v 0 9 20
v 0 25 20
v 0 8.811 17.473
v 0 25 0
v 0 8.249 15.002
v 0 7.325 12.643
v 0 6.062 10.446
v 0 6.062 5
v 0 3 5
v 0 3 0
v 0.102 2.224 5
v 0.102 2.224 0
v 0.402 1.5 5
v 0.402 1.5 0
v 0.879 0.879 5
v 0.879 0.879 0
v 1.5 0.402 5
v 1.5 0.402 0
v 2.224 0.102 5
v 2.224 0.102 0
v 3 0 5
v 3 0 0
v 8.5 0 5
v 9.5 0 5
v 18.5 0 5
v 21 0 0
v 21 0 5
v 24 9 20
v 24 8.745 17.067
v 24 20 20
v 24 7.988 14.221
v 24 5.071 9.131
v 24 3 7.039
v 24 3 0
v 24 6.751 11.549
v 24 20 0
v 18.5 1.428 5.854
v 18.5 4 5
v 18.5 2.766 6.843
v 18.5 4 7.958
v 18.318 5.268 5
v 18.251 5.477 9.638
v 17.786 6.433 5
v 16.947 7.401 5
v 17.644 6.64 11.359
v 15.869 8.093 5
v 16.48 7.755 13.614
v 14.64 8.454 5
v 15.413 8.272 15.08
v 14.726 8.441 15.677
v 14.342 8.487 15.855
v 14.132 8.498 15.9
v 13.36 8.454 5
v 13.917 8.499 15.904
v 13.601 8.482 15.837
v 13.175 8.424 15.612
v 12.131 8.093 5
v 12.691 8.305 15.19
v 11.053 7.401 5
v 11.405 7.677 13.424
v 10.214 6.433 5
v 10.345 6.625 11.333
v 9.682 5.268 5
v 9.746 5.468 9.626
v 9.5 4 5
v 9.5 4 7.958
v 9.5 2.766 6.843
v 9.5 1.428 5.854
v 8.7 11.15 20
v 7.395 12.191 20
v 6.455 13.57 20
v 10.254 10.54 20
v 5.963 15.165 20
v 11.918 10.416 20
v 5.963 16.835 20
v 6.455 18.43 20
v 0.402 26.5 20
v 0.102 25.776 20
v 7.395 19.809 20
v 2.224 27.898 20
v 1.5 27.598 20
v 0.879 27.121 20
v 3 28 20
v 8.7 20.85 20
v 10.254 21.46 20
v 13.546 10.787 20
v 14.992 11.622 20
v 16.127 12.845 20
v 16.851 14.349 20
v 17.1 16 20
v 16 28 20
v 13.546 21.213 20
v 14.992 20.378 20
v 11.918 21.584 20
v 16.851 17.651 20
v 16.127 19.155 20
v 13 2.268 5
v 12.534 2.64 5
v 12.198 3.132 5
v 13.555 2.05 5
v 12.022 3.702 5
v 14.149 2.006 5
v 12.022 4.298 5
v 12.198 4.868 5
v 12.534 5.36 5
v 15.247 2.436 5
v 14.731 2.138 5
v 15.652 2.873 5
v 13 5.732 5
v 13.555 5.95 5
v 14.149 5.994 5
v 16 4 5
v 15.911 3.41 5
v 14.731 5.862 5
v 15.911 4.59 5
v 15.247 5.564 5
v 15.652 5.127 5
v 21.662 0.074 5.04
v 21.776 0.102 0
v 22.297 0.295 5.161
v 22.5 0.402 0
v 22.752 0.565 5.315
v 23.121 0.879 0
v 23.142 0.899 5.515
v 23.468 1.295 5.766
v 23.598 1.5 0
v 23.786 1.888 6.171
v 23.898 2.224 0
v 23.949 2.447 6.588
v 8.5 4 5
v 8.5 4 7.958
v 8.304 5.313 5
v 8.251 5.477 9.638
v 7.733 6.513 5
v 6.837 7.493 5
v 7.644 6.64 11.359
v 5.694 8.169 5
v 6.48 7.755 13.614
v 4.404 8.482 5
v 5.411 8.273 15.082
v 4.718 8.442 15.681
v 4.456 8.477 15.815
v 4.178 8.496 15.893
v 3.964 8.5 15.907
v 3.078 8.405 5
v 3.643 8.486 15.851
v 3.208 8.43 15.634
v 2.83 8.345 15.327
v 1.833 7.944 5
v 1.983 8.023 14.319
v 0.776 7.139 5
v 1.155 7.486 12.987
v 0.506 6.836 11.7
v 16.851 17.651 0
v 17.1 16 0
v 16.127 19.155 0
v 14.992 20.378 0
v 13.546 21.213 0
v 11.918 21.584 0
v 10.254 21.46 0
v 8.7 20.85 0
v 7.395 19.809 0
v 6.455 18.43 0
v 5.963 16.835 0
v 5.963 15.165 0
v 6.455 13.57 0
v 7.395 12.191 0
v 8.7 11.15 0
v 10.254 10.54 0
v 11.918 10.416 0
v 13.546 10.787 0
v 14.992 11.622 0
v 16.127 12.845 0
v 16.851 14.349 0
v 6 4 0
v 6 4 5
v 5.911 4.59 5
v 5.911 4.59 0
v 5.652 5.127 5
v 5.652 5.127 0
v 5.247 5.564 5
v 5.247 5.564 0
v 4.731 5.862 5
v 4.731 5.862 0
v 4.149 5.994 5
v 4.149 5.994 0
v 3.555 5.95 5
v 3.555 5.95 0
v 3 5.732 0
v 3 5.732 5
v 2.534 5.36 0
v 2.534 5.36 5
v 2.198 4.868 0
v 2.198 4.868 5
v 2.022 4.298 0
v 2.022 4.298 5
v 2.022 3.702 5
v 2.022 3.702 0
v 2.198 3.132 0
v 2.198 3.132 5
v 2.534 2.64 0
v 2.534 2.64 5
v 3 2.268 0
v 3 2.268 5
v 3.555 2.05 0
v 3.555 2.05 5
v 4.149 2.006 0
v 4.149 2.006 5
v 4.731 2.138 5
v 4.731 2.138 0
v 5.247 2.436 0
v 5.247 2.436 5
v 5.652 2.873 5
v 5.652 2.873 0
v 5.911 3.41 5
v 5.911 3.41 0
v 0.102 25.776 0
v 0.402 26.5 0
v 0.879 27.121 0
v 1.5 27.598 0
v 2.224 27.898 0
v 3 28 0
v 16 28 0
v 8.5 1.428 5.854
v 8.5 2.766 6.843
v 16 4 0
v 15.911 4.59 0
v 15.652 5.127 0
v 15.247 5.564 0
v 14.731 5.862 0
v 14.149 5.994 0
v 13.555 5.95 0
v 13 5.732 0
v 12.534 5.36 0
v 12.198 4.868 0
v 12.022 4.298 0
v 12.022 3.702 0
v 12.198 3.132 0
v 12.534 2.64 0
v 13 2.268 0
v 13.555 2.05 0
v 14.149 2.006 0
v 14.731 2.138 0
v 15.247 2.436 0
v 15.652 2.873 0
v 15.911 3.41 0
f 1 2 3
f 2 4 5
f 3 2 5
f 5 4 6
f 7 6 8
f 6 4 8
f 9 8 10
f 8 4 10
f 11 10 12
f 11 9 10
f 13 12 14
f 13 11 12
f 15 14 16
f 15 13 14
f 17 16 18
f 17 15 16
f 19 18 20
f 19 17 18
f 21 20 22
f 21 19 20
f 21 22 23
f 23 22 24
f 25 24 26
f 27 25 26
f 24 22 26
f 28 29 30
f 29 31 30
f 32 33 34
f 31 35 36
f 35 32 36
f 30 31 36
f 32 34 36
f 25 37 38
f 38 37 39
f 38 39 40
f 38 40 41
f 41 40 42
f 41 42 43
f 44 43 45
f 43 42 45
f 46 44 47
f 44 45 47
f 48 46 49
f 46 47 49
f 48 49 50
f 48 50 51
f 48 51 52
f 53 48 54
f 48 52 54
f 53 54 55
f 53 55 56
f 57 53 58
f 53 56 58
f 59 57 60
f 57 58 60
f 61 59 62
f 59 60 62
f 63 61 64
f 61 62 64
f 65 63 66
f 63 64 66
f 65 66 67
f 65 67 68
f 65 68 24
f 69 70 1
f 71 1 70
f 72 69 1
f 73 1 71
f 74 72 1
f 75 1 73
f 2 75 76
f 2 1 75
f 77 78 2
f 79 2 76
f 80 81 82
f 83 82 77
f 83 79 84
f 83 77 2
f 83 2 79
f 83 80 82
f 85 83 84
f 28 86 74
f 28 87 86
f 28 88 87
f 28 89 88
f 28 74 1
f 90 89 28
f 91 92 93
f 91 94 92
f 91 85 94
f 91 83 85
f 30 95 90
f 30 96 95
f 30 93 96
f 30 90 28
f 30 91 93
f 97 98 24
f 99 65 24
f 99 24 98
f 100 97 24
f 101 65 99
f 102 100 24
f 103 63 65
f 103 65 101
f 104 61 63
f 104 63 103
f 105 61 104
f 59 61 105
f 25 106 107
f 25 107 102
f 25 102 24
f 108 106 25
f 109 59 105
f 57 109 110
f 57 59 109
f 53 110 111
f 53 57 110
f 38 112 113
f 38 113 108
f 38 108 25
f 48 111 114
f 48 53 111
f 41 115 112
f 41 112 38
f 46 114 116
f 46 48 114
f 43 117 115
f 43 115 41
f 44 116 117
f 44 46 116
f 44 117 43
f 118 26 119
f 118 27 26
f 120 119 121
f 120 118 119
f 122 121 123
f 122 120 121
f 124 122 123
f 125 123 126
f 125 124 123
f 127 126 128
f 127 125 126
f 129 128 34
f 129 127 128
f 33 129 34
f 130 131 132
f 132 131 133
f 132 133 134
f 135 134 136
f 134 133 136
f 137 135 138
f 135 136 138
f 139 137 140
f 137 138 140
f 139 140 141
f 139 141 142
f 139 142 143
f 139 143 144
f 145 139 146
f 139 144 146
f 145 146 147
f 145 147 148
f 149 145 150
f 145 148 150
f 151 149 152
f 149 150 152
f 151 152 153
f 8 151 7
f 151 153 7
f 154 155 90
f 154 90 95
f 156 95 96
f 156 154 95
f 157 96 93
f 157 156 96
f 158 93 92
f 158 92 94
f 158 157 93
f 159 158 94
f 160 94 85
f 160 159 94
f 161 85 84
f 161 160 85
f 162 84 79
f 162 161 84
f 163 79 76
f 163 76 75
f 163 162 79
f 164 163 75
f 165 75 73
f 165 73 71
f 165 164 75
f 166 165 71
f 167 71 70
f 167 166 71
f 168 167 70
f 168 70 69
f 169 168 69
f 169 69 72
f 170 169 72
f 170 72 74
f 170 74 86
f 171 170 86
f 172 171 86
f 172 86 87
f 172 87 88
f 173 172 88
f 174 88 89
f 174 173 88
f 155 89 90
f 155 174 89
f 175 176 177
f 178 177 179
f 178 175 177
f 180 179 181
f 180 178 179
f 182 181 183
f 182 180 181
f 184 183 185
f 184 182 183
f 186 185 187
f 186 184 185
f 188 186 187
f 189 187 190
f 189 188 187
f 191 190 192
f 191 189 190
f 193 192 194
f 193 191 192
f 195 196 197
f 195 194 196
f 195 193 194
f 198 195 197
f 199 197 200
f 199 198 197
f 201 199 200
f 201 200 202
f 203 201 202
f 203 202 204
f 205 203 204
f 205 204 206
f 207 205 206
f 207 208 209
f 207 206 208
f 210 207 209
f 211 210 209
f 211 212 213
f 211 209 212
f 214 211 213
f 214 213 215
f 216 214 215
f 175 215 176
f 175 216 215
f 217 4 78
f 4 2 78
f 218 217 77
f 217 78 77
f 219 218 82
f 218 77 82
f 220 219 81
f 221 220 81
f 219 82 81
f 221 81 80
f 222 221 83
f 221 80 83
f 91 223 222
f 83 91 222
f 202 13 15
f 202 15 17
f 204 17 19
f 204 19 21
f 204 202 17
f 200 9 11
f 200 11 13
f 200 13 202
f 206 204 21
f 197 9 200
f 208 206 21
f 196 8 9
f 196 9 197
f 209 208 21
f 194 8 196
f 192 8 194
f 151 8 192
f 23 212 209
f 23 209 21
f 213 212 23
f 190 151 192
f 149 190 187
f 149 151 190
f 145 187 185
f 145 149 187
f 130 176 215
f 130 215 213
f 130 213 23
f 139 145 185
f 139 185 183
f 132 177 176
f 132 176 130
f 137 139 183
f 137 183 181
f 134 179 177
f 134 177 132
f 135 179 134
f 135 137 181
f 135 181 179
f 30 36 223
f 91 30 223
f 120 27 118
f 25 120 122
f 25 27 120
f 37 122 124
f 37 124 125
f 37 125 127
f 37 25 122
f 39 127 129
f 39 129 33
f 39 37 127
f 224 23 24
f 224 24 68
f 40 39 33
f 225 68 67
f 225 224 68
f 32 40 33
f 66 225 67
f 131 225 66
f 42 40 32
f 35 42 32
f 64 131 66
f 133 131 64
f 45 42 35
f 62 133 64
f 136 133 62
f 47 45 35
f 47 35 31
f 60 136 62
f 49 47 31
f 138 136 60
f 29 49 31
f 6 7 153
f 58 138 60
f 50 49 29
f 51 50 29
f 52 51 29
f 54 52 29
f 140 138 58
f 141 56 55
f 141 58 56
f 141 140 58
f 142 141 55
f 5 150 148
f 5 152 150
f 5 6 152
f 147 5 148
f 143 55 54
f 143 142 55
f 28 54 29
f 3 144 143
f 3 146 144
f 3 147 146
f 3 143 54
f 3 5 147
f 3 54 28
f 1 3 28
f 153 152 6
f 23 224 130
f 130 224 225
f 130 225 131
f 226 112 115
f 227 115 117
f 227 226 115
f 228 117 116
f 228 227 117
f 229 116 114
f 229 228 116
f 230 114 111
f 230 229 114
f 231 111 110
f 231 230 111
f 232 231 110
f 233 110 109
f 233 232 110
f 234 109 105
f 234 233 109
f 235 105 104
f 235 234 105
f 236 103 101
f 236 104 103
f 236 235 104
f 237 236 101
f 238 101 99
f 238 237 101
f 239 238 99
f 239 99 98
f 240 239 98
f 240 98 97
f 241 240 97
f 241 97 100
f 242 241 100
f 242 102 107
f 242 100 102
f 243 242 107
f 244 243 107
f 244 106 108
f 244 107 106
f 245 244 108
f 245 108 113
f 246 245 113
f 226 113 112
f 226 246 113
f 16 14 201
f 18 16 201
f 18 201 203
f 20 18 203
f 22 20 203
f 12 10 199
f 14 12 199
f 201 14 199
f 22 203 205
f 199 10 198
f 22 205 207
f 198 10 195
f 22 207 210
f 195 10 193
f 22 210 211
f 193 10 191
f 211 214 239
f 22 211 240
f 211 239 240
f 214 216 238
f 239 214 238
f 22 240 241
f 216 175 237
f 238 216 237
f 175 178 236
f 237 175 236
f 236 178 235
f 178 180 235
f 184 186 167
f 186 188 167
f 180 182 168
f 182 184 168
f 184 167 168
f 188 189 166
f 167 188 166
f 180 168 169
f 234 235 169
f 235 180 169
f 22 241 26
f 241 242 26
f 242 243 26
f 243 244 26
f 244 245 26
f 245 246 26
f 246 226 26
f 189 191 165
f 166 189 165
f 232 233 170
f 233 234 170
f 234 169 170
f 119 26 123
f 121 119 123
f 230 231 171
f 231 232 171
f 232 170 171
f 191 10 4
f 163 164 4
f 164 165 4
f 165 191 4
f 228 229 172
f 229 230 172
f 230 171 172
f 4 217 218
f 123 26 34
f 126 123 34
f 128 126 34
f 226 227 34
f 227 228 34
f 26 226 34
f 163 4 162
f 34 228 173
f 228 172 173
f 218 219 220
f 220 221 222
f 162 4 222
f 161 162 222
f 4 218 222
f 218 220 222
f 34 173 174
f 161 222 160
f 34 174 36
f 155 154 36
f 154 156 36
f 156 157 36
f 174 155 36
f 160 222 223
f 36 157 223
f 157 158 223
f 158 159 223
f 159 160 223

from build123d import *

# Parameters (mm, degrees)
SKETCH1_R           = 2
SKETCH1_R_2         = 5.6
BOSS_EXTRUDE1_DEPTH = 20
CUT_EXTRUDE1_DEPTH  = 30
CUT_EXTRUDE2_DEPTH  = 15
FILLET1_R           = 3


with BuildPart() as part:
    # Sketch1 → Boss-Extrude1 (new body)
    with BuildSketch(Plane.XY):
        Polygon((24, 20), (16, 28), (0, 28), (0, 0), (24, 0), align=None)
        with Locations((4, 4)):
            Circle(SKETCH1_R, mode=Mode.SUBTRACT)
        with Locations((14, 4)):
            Circle(SKETCH1_R, mode=Mode.SUBTRACT)
        with Locations((11.5, 16)):
            Circle(SKETCH1_R_2, mode=Mode.SUBTRACT)
    extrude(amount=BOSS_EXTRUDE1_DEPTH)

    # Sketch2 → Cut-Extrude1 (cut)
    with BuildSketch(Plane.ZY):
        with BuildLine():
            Line((20, 9), (20, 0))
            Line((20, 0), (5, 0))
            ThreePointArc((5, 0), (11.253572158, 6.577379737), (20, 9))
        make_face()
    extrude(amount=-CUT_EXTRUDE1_DEPTH, mode=Mode.SUBTRACT)

    # Sketch3 → Cut-Extrude2 (cut)
    with BuildSketch(Plane.XY.offset(20)):
        with BuildLine():
            ThreePointArc((14, -0.5), (17.181980515, 0.818019485), (18.5, 4))
            Line((18.5, 4), (9.5, 4))
            ThreePointArc((9.5, 4), (10.818019485, 0.818019485), (14, -0.5))
        make_face()
        with BuildLine():
            Line((9.5, 4), (18.5, 4))
            ThreePointArc((18.5, 4), (14, 8.5), (9.5, 4))
        make_face()
        with BuildLine():
            ThreePointArc((14, -0.5), (10.818019485, 0.818019485), (9.5, 4))
            Line((9.5, 4), (9.5, -0.5))
            Line((9.5, -0.5), (14, -0.5))
        make_face()
        with BuildLine():
            Line((18.5, -0.5), (18.5, 4))
            ThreePointArc((18.5, 4), (17.181980515, 0.818019485), (14, -0.5))
            Line((14, -0.5), (18.5, -0.5))
        make_face()
        with BuildLine():
            ThreePointArc((4, -0.5), (7.181980515, 0.818019485), (8.5, 4))
            Line((8.5, 4), (0, 4))
            Line((0, 4), (0, 1.938447187))
            ThreePointArc((0, 1.938447187), (1.657670781, 0.157670781), (4, -0.5))
        make_face()
        with BuildLine():
            Line((0, 4), (8.5, 4))
            ThreePointArc((8.5, 4), (2.939339828, 8.373213921), (0, 1.938447187))
            Line((0, 1.938447187), (0, 4))
        make_face()
        with BuildLine():
            Line((8.5, -0.5), (8.5, 4))
            ThreePointArc((8.5, 4), (7.181980515, 0.818019485), (4, -0.5))
            Line((4, -0.5), (8.5, -0.5))
        make_face()
        with BuildLine():
            ThreePointArc((4, -0.5), (1.657670781, 0.157670781), (0, 1.938447187))
            Line((0, 1.938447187), (0, -0.5))
            Line((0, -0.5), (4, -0.5))
        make_face()
    extrude(amount=-CUT_EXTRUDE2_DEPTH, mode=Mode.SUBTRACT)

    # Fillet1
    fillet1_edges = [part.edges().sort_by_distance(p)[0] for p in [
        (0, 28, 10),
        (0, 0, 2.5),
        (24, 0, 2.5),
    ]]
    fillet(fillet1_edges, radius=FILLET1_R)


solid = part.part
